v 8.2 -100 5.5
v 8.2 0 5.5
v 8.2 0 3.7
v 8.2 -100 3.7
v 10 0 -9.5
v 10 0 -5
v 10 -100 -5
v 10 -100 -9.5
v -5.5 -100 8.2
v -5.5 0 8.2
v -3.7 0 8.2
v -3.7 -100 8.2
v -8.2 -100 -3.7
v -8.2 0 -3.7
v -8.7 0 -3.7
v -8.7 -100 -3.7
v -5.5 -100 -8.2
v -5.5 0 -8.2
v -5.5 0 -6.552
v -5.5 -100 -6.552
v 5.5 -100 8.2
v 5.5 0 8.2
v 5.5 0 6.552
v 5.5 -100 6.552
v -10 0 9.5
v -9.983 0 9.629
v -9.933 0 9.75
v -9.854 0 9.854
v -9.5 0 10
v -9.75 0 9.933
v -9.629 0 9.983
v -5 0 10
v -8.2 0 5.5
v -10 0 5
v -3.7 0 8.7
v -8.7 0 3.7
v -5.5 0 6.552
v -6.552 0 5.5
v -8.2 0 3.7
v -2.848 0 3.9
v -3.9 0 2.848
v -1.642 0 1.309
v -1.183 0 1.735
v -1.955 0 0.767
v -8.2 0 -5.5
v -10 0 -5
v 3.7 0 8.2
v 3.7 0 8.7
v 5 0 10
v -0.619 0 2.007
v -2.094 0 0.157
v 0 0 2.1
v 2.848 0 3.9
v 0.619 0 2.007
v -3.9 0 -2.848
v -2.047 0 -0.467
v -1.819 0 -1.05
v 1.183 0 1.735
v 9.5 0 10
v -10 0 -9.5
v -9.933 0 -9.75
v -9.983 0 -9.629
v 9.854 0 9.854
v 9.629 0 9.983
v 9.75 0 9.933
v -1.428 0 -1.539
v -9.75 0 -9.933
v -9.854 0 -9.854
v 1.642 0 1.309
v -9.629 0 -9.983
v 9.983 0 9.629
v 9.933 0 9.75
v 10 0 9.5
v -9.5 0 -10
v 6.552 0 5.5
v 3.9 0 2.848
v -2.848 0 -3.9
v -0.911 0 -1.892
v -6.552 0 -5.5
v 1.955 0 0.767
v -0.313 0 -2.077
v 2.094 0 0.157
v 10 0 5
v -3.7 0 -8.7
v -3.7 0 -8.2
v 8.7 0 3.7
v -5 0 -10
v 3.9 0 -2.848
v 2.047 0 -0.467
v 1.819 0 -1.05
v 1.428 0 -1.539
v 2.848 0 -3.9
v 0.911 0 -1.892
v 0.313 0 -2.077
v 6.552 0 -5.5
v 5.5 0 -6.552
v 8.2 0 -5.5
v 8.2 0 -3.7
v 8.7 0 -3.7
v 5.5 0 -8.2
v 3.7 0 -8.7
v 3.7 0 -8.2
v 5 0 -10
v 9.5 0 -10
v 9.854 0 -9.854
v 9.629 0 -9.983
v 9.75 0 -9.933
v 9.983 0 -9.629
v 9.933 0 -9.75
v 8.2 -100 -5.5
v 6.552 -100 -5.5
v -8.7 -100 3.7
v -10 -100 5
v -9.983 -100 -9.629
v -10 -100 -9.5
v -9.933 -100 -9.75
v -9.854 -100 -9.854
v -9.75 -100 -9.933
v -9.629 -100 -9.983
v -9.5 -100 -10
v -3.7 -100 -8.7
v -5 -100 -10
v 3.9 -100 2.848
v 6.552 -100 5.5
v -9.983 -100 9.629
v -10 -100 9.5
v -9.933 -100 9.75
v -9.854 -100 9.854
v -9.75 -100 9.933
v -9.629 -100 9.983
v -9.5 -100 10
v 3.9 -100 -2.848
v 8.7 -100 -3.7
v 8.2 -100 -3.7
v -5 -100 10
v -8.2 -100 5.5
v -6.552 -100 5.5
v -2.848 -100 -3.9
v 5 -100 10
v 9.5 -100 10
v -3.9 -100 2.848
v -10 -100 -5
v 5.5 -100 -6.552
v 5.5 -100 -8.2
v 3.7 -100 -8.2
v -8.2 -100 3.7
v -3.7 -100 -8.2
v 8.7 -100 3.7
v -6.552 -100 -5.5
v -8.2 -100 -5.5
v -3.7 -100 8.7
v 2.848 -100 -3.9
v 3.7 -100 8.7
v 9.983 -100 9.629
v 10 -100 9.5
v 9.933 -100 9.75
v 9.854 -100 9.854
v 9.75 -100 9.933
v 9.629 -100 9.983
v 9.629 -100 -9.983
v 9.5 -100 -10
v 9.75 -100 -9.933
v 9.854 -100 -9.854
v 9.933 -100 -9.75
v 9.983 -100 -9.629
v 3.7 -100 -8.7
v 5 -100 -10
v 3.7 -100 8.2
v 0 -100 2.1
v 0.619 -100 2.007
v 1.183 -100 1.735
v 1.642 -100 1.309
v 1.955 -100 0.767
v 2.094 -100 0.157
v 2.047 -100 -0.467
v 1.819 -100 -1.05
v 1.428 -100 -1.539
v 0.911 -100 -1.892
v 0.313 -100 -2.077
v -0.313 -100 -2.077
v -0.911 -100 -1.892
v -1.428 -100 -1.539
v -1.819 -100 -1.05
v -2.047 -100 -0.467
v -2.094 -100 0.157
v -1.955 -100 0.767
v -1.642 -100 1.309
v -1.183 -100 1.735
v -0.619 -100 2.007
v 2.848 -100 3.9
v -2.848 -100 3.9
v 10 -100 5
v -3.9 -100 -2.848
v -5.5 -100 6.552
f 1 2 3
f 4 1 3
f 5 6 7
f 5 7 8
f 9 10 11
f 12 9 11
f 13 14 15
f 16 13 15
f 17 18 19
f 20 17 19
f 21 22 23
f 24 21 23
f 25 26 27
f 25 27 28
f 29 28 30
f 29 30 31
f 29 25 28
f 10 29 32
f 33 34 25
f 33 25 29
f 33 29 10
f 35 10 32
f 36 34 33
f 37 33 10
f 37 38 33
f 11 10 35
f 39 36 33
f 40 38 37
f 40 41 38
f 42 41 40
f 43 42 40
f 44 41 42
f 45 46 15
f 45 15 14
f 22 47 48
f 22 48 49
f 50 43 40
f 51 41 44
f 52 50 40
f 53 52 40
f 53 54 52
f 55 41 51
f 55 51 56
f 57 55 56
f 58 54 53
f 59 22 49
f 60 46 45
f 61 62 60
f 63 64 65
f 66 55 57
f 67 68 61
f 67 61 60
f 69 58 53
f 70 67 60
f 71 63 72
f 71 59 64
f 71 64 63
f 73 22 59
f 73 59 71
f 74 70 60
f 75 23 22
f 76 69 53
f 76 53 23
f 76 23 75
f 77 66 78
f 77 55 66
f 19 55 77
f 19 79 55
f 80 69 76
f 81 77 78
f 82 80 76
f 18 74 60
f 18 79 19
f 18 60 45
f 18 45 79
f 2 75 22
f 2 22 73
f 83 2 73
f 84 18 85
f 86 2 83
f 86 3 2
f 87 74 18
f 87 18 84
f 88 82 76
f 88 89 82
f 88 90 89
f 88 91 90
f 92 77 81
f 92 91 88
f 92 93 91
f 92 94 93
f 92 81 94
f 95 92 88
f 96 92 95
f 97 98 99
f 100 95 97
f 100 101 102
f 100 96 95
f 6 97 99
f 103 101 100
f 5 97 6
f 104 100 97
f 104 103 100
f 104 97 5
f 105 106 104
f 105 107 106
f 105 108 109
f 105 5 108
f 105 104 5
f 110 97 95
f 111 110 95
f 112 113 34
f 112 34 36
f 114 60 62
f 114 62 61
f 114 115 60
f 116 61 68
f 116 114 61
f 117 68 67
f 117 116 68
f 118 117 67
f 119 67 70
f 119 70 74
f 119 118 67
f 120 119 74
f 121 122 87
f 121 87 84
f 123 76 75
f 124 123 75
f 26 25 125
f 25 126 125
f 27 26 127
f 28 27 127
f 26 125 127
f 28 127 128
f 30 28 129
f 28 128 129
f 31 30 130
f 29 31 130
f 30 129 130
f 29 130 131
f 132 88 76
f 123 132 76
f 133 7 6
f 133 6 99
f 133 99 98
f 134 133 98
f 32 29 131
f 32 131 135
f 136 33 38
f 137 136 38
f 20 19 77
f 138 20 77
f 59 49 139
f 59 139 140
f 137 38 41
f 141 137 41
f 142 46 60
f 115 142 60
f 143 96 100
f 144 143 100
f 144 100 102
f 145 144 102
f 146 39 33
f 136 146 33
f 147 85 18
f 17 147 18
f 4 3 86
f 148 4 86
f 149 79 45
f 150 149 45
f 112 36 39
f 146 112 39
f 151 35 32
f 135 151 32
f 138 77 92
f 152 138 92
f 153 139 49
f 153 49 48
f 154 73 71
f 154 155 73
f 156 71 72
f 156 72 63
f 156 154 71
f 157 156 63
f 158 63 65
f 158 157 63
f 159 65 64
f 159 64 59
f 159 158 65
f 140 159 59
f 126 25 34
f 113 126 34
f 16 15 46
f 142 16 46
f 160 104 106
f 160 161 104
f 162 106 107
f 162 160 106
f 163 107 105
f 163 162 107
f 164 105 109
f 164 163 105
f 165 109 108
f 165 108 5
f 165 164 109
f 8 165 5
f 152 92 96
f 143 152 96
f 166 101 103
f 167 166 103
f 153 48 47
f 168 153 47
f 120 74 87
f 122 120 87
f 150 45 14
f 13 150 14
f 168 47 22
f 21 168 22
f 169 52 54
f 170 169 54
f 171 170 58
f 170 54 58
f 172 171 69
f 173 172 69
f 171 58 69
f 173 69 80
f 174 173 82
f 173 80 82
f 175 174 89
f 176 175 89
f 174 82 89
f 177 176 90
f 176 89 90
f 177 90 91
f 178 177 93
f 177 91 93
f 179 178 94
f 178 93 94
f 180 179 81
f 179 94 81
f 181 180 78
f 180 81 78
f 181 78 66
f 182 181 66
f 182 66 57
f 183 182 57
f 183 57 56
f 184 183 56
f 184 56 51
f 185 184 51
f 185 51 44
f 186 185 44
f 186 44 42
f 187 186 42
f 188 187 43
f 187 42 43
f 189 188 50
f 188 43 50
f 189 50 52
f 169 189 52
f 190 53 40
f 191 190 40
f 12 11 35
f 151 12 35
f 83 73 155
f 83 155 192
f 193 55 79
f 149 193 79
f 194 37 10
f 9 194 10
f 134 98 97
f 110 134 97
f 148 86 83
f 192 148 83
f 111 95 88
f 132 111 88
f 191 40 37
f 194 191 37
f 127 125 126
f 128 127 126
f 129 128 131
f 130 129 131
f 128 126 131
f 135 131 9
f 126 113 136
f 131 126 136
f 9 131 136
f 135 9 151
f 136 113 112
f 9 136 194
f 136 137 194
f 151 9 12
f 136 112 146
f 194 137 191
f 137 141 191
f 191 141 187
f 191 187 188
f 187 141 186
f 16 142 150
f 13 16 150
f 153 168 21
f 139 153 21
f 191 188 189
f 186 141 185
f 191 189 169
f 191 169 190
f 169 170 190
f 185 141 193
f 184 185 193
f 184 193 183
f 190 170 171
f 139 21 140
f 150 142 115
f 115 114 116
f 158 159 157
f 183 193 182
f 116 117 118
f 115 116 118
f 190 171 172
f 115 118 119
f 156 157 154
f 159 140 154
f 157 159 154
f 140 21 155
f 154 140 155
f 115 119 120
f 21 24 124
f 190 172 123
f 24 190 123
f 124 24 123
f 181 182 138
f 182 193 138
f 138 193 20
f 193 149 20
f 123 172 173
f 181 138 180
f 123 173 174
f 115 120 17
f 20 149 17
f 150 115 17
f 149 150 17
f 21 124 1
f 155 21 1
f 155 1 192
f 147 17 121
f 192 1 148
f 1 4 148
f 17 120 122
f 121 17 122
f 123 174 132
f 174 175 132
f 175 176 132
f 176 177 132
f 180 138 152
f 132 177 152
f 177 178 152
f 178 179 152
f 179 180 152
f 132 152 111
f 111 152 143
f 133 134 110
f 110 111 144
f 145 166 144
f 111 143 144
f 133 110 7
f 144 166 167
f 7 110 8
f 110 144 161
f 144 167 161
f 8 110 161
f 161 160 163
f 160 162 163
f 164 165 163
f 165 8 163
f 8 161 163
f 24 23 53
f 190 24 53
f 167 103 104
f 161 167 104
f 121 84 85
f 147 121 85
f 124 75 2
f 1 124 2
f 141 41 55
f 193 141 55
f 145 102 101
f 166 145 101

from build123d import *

# Parameters (mm, degrees)
SKETCH2_W           = 20
SKETCH2_H           = 20
SKETCH2_R           = 2.1
BOSS_EXTRUDE1_DEPTH = 100
CUT_EXTRUDE1_DEPTH  = 101.995049384
FILLET1_R           = 0.5


with BuildPart() as part:
    # Sketch2 → Boss-Extrude1 (new body)
    with BuildSketch(Plane(origin=(0, 0, 0), x_dir=(1, 0, 0), z_dir=(0, 1, 0))):
        Rectangle(SKETCH2_W, SKETCH2_H)
        with Locations(Location((0, 0, 0), (0, 0, 270))):
            Circle(SKETCH2_R, mode=Mode.SUBTRACT)
    extrude(amount=-BOSS_EXTRUDE1_DEPTH)

    # Sketch3 → Cut-Extrude1 (cut, through all)
    with BuildSketch(Plane(origin=(0, 0, 0), x_dir=(1, 0, 0), z_dir=(0, 1, 0))):
        Polygon((5.5, -6.551650429), (2.848349571, -3.9), (-2.848349571, -3.9), (-5.5, -6.551650429), (-5.5, -8.2), (-3.7, -8.2), (-3.7, -8.7), (-5, -10), (5, -10), (3.7, -8.7), (3.7, -8.2), (5.5, -8.2), align=None)
        Polygon((3.9, 2.848349571), (3.9, -2.848349571), (6.551650429, -5.5), (8.2, -5.5), (8.2, -3.7), (8.7, -3.7), (10, -5), (10, 5), (8.7, 3.7), (8.2, 3.7), (8.2, 5.5), (6.551650429, 5.5), align=None)
        Polygon((-6.551650429, -5.5), (-3.9, -2.848349571), (-3.9, 2.848349571), (-6.551650429, 5.5), (-8.2, 5.5), (-8.2, 3.7), (-8.7, 3.7), (-10, 5), (-10, -5), (-8.7, -3.7), (-8.2, -3.7), (-8.2, -5.5), align=None)
        Polygon((-2.848349571, 3.9), (2.848349571, 3.9), (5.5, 6.551650429), (5.5, 8.2), (3.7, 8.2), (3.7, 8.7), (5, 10), (-5, 10), (-3.7, 8.7), (-3.7, 8.2), (-5.5, 8.2), (-5.5, 6.551650429), align=None)
    extrude(amount=-CUT_EXTRUDE1_DEPTH, mode=Mode.SUBTRACT)

    # Fillet1
    fillet1_edges = [part.edges().sort_by_distance(p)[0] for p in [
        (-10, -50, -10),
        (10, -50, -10),
        (10, -50, 10),
        (-10, -50, 10),
    ]]
    fillet(fillet1_edges, radius=FILLET1_R)


solid = part.part
